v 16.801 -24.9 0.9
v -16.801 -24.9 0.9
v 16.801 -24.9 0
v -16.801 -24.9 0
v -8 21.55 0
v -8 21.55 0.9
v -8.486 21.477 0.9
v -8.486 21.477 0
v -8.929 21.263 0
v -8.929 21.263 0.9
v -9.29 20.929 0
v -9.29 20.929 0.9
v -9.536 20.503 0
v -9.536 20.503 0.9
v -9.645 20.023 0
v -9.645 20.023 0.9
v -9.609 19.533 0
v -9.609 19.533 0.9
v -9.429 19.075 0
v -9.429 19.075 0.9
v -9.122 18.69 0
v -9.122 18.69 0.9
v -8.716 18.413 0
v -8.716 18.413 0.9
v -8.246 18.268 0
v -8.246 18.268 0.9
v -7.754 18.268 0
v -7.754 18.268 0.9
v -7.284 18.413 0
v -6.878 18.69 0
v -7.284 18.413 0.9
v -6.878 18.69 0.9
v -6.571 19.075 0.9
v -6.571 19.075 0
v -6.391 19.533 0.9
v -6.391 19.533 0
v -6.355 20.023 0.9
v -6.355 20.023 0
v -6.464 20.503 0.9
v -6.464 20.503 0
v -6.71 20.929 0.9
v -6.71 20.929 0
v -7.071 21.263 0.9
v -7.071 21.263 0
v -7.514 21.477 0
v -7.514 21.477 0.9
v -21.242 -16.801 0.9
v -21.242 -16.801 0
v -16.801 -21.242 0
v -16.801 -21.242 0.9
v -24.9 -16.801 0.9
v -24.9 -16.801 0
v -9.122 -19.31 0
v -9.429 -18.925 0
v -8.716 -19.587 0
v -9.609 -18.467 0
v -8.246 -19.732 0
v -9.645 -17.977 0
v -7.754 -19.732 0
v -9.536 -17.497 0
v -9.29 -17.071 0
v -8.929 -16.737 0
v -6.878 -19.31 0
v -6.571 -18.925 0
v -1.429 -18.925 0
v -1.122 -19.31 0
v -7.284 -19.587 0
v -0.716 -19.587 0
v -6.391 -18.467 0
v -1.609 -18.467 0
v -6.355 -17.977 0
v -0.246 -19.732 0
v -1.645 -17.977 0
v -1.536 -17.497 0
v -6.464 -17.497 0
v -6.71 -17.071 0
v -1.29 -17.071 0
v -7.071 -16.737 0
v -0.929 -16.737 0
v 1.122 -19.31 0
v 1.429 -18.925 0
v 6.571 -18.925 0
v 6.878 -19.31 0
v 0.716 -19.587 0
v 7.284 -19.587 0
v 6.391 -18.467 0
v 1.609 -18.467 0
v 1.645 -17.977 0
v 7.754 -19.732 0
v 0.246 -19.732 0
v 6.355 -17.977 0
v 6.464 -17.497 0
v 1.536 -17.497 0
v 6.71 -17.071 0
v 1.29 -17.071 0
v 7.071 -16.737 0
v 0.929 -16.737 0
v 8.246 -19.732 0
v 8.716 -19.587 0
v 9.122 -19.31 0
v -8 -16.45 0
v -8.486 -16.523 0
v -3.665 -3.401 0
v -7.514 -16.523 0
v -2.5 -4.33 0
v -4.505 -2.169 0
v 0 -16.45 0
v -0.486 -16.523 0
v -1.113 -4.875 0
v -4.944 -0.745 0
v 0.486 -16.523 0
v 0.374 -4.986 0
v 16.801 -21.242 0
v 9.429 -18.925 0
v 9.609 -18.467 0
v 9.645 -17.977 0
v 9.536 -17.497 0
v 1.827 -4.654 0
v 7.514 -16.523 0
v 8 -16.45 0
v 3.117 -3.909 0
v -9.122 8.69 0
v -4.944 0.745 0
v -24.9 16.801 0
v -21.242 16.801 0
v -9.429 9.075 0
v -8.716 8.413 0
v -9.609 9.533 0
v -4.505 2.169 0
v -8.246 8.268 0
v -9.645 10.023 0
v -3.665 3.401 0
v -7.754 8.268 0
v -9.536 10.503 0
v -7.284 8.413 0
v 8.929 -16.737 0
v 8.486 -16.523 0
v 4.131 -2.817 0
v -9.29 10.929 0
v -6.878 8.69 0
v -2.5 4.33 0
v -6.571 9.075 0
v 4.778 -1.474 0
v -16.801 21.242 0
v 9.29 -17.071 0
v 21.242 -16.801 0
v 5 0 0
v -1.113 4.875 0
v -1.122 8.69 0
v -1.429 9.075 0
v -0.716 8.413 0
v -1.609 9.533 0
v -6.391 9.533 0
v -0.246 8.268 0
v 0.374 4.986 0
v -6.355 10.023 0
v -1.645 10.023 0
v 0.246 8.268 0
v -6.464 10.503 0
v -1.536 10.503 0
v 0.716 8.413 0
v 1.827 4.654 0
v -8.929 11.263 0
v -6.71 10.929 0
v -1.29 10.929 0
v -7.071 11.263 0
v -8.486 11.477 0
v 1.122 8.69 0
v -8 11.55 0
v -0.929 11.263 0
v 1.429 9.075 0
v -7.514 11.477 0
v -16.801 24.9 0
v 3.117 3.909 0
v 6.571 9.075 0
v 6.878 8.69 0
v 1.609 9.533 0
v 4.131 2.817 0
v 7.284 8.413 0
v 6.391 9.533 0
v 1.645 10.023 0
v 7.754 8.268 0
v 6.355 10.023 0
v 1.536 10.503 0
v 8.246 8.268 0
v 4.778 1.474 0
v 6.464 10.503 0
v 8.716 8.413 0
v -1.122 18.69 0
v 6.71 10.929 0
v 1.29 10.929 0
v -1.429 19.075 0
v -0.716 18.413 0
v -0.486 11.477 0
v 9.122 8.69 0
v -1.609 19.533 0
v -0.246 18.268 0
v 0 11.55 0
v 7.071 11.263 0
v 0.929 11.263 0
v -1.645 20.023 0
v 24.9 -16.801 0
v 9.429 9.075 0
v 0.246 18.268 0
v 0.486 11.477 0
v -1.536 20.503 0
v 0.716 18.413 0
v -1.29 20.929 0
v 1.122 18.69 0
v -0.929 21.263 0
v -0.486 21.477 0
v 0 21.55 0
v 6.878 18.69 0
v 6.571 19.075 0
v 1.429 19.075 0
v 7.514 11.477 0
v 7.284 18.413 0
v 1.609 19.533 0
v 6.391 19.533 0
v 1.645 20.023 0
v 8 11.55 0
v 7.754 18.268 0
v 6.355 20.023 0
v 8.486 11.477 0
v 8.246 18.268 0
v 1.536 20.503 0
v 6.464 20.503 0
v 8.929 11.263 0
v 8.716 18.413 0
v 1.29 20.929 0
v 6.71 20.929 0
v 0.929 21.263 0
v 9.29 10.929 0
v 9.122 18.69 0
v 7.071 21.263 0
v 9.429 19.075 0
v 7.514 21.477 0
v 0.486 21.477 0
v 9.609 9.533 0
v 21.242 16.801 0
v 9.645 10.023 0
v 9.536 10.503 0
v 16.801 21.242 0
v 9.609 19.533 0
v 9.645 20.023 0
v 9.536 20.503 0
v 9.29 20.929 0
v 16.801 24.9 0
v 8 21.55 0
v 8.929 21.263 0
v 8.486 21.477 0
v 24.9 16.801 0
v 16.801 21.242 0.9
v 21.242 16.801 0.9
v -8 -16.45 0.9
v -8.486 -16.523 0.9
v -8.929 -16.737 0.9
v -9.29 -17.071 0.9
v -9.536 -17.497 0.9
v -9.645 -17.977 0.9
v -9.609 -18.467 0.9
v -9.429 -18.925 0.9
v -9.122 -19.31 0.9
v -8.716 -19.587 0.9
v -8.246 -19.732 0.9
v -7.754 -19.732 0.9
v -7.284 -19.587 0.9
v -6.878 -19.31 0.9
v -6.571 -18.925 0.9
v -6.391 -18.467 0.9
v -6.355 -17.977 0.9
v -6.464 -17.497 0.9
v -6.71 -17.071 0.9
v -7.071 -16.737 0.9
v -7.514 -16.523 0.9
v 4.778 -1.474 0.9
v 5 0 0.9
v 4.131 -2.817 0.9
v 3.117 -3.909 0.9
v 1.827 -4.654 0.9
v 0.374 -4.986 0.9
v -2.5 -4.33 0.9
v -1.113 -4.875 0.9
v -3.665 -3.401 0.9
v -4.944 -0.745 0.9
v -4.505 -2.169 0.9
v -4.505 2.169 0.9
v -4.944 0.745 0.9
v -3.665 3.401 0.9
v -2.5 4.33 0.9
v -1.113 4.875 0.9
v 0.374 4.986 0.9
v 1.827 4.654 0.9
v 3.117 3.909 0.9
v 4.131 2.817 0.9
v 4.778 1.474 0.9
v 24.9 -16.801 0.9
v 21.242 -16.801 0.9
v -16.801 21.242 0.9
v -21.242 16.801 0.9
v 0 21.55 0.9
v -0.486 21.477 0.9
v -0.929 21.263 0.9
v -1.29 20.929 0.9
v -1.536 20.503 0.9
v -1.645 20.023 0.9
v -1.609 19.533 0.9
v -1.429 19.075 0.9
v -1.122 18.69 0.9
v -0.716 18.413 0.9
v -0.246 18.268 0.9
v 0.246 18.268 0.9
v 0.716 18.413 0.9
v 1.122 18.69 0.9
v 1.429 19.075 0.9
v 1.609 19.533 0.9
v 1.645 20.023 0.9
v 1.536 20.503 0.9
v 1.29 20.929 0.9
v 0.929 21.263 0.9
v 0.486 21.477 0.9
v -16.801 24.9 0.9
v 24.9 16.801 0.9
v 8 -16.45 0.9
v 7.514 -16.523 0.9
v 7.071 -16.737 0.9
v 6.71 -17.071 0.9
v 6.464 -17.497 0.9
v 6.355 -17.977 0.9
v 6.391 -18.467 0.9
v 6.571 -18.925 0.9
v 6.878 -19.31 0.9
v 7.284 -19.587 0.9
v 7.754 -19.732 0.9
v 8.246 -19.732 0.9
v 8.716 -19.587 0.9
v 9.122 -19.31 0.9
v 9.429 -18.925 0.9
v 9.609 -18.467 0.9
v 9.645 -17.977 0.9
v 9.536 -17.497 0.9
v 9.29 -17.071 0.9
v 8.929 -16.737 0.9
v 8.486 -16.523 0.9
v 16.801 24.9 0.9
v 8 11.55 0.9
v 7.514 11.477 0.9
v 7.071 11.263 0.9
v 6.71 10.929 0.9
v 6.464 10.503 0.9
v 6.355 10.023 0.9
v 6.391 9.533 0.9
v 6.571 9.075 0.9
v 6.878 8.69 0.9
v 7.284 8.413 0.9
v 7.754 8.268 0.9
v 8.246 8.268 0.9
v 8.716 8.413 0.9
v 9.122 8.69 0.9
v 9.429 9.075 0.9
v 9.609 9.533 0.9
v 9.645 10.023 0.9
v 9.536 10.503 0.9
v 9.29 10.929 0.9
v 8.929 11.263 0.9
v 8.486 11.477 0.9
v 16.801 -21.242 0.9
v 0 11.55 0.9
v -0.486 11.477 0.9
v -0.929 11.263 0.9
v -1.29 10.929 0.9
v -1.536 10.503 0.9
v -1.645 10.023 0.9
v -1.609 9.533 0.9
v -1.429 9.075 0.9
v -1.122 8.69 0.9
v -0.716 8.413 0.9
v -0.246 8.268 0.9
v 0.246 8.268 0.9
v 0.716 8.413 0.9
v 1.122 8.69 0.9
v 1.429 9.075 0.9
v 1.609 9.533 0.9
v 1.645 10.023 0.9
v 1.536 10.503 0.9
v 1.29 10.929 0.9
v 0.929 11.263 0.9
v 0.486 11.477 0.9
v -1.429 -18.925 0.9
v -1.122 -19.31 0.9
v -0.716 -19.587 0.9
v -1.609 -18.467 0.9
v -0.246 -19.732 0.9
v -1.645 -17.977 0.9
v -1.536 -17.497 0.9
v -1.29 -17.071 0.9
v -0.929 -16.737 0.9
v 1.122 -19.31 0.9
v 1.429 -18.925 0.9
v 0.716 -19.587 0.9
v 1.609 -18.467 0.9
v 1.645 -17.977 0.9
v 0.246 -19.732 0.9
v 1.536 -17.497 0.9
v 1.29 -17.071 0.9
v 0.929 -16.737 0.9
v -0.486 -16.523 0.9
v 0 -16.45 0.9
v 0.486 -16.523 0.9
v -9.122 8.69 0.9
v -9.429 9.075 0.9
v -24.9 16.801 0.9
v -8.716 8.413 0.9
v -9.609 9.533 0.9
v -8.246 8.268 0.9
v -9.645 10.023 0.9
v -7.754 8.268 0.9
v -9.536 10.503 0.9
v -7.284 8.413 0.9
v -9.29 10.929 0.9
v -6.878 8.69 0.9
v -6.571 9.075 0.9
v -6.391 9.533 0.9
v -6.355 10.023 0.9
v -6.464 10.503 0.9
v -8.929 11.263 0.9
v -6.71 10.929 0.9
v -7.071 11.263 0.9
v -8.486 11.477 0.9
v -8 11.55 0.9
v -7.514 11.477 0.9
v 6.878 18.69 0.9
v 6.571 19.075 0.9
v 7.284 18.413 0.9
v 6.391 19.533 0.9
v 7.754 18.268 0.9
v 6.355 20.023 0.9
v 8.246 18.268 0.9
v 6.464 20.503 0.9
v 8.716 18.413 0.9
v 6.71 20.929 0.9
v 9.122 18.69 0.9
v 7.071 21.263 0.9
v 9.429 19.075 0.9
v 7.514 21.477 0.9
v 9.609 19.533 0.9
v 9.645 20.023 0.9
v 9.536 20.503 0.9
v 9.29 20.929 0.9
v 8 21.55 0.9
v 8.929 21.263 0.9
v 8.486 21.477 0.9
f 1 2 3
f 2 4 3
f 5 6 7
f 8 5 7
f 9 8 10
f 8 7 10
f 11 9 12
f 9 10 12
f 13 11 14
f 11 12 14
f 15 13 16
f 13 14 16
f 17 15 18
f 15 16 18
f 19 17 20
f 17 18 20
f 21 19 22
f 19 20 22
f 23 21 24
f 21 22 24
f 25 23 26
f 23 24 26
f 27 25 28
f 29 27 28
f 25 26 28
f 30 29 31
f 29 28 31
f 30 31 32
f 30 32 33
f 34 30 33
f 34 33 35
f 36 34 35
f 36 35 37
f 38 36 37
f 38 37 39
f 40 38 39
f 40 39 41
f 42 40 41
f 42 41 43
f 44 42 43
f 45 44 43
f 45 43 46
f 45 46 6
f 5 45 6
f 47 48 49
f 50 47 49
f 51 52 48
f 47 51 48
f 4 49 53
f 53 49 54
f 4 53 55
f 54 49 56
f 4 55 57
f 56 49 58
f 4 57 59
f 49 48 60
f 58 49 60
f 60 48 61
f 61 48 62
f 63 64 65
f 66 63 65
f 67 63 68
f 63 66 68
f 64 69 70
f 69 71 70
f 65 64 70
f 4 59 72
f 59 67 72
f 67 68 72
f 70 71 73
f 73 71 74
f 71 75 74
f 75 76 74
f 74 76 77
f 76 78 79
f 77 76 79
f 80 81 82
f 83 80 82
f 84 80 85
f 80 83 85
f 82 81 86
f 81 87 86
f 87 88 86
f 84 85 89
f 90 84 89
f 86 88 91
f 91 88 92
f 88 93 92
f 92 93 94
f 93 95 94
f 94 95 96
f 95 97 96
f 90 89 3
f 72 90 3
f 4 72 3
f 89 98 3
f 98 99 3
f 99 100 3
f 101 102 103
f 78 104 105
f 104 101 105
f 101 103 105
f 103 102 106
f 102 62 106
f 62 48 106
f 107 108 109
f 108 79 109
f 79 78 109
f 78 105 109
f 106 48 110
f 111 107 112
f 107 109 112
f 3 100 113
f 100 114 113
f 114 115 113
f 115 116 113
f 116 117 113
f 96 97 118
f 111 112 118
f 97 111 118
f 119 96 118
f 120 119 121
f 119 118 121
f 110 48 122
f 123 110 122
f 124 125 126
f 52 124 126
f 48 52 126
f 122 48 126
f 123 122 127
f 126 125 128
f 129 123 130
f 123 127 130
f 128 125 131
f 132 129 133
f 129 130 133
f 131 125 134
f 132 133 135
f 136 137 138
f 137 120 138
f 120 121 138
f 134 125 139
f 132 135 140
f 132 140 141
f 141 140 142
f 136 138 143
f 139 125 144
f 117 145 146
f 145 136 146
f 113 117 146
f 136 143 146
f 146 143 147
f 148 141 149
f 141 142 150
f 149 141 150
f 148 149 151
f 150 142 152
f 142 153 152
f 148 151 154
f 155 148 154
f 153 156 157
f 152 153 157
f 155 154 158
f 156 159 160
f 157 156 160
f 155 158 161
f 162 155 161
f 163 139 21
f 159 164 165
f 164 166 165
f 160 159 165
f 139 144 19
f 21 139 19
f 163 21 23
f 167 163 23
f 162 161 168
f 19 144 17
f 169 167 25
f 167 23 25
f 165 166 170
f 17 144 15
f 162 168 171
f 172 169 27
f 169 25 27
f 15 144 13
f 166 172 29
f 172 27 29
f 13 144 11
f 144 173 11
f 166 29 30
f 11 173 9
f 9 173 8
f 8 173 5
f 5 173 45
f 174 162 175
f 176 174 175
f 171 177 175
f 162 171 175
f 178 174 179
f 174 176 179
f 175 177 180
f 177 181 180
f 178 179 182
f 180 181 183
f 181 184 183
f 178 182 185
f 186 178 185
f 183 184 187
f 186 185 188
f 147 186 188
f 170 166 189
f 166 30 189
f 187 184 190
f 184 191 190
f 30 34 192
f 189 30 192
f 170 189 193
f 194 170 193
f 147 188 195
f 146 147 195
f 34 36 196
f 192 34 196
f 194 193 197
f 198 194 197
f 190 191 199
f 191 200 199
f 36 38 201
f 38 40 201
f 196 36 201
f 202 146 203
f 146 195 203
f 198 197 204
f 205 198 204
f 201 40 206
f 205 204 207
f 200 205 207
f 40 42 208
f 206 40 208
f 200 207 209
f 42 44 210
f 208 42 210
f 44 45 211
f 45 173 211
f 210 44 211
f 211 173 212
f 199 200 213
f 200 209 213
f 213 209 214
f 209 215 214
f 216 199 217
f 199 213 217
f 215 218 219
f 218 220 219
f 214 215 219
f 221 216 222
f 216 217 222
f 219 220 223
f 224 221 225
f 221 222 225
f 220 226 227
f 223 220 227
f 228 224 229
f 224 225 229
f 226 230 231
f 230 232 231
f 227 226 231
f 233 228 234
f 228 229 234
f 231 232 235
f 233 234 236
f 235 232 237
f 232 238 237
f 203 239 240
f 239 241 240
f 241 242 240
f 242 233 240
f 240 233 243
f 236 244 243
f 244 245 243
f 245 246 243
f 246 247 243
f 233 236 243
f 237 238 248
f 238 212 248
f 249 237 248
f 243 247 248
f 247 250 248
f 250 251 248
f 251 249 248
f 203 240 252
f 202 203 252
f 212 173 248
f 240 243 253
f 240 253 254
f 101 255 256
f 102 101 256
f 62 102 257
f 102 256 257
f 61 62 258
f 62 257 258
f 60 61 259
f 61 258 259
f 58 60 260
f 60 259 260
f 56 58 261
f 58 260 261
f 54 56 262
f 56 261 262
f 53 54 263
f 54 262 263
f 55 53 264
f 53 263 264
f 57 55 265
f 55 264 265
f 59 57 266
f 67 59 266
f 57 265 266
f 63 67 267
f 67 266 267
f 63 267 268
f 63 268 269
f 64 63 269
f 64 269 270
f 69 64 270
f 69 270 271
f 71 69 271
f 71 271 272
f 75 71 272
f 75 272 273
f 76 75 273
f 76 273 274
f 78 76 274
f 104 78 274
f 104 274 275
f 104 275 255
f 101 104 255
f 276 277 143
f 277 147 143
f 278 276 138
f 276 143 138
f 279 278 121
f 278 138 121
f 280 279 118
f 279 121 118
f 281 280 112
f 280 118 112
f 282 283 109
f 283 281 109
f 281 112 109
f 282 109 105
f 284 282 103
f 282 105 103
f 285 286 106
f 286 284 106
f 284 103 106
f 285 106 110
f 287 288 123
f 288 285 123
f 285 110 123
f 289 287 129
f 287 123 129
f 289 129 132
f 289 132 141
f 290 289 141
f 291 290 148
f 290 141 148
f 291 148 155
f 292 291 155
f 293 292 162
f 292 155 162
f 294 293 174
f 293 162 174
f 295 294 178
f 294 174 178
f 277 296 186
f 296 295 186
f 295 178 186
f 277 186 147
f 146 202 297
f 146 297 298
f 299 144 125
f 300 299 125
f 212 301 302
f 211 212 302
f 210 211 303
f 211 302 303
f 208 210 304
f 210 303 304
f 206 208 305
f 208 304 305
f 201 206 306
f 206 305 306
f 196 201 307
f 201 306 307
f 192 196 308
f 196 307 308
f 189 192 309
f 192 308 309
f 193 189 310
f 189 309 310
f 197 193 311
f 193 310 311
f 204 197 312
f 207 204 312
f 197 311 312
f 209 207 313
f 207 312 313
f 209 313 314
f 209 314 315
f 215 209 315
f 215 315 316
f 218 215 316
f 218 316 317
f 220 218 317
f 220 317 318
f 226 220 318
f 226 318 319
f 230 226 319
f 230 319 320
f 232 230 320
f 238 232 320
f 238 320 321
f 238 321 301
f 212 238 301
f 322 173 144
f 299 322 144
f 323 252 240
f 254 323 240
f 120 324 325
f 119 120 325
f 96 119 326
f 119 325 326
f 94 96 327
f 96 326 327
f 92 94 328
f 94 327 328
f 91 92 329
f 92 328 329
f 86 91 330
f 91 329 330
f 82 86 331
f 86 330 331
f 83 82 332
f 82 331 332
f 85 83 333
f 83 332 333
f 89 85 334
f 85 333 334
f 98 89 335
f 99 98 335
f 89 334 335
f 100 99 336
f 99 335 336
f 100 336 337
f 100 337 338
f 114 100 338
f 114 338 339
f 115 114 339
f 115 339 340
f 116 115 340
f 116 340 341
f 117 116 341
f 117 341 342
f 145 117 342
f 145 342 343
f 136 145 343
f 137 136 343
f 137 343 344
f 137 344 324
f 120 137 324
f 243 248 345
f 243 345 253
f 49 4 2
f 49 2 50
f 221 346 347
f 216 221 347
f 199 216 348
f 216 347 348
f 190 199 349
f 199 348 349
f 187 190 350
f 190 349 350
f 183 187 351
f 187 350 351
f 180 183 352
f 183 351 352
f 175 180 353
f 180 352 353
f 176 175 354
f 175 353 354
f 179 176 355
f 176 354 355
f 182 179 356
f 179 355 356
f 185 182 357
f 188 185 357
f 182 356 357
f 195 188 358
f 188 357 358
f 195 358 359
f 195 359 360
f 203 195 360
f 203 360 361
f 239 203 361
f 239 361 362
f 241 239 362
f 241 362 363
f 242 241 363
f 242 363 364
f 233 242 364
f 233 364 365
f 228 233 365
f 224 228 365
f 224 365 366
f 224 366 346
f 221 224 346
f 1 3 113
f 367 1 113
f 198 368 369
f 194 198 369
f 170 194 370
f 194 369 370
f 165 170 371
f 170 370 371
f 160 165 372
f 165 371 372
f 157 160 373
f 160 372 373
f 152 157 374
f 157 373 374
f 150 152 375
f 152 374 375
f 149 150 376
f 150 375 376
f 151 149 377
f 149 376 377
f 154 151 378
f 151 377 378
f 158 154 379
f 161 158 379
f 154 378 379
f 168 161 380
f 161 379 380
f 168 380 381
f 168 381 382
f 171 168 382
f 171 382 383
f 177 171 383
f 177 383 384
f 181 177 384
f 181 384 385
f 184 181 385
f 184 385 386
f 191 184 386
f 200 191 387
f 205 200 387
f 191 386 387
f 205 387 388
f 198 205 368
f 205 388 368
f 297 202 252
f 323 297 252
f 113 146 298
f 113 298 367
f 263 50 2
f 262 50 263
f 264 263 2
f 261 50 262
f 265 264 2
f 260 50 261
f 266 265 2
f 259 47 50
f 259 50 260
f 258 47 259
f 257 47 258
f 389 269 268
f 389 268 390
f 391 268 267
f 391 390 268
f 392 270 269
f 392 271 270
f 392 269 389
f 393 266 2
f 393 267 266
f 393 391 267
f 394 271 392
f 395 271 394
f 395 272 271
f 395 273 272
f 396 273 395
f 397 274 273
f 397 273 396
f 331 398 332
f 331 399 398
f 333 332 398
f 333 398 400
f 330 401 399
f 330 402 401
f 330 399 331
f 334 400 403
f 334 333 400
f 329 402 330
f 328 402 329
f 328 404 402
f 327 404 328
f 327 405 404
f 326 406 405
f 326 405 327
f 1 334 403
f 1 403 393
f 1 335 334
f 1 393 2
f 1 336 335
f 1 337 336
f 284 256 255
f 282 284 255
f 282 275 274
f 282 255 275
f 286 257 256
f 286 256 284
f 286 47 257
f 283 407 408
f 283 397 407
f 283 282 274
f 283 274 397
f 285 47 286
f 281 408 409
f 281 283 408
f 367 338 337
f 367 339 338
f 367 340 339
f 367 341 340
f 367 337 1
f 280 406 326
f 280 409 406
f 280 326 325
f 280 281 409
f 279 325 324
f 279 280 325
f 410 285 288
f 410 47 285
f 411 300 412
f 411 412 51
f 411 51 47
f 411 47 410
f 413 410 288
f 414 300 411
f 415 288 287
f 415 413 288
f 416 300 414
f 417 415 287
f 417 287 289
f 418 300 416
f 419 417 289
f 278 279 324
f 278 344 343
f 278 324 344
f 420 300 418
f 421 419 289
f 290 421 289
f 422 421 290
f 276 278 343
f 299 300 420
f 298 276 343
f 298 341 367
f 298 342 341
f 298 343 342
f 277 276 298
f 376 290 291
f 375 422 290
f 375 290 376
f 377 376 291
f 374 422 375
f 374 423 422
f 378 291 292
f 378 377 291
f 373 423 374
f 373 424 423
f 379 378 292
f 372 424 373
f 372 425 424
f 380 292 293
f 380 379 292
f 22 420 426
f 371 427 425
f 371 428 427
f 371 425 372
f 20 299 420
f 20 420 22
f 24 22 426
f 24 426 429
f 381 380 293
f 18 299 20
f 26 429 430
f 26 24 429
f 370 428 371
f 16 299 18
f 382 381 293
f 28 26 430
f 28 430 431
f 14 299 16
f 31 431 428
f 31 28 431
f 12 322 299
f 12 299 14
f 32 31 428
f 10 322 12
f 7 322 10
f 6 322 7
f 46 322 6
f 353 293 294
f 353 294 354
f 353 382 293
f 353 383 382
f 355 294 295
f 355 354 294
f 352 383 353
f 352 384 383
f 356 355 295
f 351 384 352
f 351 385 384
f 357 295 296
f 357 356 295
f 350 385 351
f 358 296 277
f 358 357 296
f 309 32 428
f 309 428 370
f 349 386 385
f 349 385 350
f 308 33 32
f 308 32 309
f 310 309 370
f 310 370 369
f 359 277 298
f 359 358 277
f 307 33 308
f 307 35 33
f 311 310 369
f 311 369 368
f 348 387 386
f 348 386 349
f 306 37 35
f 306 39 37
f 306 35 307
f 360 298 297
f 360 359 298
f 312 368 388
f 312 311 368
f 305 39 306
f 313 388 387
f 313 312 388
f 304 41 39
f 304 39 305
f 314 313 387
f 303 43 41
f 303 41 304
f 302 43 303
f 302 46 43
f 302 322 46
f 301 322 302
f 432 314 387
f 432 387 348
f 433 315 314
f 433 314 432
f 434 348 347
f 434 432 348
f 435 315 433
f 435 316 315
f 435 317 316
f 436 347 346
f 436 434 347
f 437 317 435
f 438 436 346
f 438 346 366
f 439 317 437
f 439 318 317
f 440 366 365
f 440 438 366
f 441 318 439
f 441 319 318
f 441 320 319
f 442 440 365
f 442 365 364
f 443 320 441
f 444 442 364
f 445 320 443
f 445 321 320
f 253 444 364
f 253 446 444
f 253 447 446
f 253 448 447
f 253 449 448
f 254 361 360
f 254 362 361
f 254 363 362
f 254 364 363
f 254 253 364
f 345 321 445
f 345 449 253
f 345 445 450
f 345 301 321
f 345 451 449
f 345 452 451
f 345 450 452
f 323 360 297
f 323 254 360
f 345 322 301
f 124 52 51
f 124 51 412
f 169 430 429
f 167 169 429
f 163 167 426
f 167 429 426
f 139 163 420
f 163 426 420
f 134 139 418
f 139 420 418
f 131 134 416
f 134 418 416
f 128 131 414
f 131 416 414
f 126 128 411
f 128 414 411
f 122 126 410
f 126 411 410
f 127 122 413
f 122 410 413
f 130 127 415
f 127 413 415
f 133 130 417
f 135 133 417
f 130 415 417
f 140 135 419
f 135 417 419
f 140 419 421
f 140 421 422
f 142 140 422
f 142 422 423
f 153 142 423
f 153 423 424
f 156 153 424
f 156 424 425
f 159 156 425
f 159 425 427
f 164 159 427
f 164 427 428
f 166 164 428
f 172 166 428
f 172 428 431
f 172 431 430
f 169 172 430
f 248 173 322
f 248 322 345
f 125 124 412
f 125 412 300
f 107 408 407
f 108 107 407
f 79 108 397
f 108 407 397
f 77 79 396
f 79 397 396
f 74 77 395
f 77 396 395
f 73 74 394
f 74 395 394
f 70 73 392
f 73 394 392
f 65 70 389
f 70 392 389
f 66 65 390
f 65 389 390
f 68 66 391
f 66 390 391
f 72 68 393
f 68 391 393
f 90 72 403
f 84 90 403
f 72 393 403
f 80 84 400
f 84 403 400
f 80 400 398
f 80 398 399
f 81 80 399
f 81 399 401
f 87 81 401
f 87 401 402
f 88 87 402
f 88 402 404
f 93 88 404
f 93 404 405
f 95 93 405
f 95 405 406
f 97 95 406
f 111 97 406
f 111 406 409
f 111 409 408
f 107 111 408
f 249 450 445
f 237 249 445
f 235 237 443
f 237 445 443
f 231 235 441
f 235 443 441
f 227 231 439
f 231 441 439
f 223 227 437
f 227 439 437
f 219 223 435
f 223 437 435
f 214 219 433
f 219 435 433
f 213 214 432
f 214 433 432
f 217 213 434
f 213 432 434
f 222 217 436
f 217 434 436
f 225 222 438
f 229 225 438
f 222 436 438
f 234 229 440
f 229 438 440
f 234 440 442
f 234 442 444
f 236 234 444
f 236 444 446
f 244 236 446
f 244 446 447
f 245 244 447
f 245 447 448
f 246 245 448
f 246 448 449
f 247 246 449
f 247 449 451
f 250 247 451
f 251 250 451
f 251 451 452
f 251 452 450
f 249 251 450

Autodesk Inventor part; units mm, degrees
ref_plane "Work Plane1" through (-29.1, -14.5, 2.4) normal (0, 0, -1) x (0, 1, 0)
ref_plane "Work Plane2" through (-15, -33.1, 1.9) normal (0, 0, -1) x (0, 1, 0)
ref_plane "Work Plane3" through (14, -23.1, 0.9) normal (0, 0, -1) x (0, 1, 0)
sketch "Sketch1" plane through (0, 0, 0) normal (0, 0, 1) x (1, 0, 0)
  line L0 (-34.86, 0) -> (34.86, 0) construction
  line L1 (0, -34.86) -> (0, 34.86) construction
  line L2 (0, 0) -> (11.1575, 11.1575) construction
  line L3 (0, 0) -> (15.7791, 0) construction
  line L4 (0, 24.9) -> (16.8009, 24.9)
  line L5 (16.8009, 24.9) -> (16.8009, 21.2415)
  line L6 (16.8009, 21.2415) -> (19.0212, 19.0212)
  line L7 (24.9, 0) -> (24.9, 16.8009)
  line L8 (24.9, 16.8009) -> (21.2415, 16.8009)
  line L9 (21.2415, 16.8009) -> (19.0212, 19.0212)
  line L10 (0, -24.9) -> (16.8009, -24.9)
  line L11 (16.8009, -24.9) -> (16.8009, -21.2415)
  line L12 (16.8009, -21.2415) -> (19.0212, -19.0212)
  line L13 (24.9, 0) -> (24.9, -16.8009)
  line L14 (24.9, -16.8009) -> (21.2415, -16.8009)
  line L15 (21.2415, -16.8009) -> (19.0212, -19.0212)
  line L16 (0, 24.9) -> (-16.8009, 24.9)
  line L17 (-16.8009, 24.9) -> (-16.8009, 21.2415)
  line L18 (-16.8009, 21.2415) -> (-19.0212, 19.0212)
  line L19 (-24.9, 16.8009) -> (-21.2415, 16.8009)
  line L20 (-21.2415, 16.8009) -> (-19.0212, 19.0212)
  line L21 (0, -24.9) -> (-16.8009, -24.9)
  line L22 (-16.8009, -24.9) -> (-16.8009, -21.2415)
  line L23 (-16.8009, -21.2415) -> (-19.0212, -19.0212)
  line L24 (-21.2415, -16.8009) -> (-19.0212, -19.0212)
  line L25 (-24.9, -16.8009) -> (-21.2415, -16.8009)
  line L26 (-24.9, 0) -> (-24.9, -16.8009)
  line L27 (-24.9, 0) -> (-24.9, 16.8009)
  circle A0 centre (0, 0) radius 5
  dimension "d0" = 45
  dimension "d2" = 24.9
  dimension "d3" = 3.14
  dimension "d4" = 26.9
  dimension "d5" = 10
extrude "Extrusion1" add sketch "Sketch1" along normal up to surface (0.9 mm away)
sketch "Sketch5" plane through (0, 0, 0) normal (0, 0, -1) x (-1, 0, 0)
  circle A0 centre (-8, -18.1) radius 1.4 construction
  circle A1 centre (0, -18.1) radius 1.4 construction
  circle A2 centre (8, -18.1) radius 1.4 construction
  circle A3 centre (-12, -18.1) radius 1.4 construction
  circle A4 centre (0, 9.9) radius 1.4 construction
  circle A5 centre (-8, 9.9) radius 1.4 construction
  circle A6 centre (8, 9.9) radius 1.4 construction
  circle A7 centre (8, 19.9) radius 1.4 construction
  circle A8 centre (0, 19.9) radius 1.4 construction
  circle A9 centre (-8, 19.9) radius 1.4 construction
  point P0 (-9.7, 10)
  point P1 (-9.7, -10)
  point P2 (13.8, 0)
  point P3 (-0.2419, -17.9861)
hole "Hole1" at (8, 19.9, 0) at (0, 19.9, 0) at (-8, 19.9, 0) at (0, -18.1, 0) at (-8, -18.1, 0) at (8, 9.9, 0) at (0, 9.9, 0) at (-8, 9.9, 0) at (8, -18.1, 0) direction (0, 0, 1) diameter 3.3 depth 12 tip angle 118
properties part number "20_Cube_insert_Sample_holder"
